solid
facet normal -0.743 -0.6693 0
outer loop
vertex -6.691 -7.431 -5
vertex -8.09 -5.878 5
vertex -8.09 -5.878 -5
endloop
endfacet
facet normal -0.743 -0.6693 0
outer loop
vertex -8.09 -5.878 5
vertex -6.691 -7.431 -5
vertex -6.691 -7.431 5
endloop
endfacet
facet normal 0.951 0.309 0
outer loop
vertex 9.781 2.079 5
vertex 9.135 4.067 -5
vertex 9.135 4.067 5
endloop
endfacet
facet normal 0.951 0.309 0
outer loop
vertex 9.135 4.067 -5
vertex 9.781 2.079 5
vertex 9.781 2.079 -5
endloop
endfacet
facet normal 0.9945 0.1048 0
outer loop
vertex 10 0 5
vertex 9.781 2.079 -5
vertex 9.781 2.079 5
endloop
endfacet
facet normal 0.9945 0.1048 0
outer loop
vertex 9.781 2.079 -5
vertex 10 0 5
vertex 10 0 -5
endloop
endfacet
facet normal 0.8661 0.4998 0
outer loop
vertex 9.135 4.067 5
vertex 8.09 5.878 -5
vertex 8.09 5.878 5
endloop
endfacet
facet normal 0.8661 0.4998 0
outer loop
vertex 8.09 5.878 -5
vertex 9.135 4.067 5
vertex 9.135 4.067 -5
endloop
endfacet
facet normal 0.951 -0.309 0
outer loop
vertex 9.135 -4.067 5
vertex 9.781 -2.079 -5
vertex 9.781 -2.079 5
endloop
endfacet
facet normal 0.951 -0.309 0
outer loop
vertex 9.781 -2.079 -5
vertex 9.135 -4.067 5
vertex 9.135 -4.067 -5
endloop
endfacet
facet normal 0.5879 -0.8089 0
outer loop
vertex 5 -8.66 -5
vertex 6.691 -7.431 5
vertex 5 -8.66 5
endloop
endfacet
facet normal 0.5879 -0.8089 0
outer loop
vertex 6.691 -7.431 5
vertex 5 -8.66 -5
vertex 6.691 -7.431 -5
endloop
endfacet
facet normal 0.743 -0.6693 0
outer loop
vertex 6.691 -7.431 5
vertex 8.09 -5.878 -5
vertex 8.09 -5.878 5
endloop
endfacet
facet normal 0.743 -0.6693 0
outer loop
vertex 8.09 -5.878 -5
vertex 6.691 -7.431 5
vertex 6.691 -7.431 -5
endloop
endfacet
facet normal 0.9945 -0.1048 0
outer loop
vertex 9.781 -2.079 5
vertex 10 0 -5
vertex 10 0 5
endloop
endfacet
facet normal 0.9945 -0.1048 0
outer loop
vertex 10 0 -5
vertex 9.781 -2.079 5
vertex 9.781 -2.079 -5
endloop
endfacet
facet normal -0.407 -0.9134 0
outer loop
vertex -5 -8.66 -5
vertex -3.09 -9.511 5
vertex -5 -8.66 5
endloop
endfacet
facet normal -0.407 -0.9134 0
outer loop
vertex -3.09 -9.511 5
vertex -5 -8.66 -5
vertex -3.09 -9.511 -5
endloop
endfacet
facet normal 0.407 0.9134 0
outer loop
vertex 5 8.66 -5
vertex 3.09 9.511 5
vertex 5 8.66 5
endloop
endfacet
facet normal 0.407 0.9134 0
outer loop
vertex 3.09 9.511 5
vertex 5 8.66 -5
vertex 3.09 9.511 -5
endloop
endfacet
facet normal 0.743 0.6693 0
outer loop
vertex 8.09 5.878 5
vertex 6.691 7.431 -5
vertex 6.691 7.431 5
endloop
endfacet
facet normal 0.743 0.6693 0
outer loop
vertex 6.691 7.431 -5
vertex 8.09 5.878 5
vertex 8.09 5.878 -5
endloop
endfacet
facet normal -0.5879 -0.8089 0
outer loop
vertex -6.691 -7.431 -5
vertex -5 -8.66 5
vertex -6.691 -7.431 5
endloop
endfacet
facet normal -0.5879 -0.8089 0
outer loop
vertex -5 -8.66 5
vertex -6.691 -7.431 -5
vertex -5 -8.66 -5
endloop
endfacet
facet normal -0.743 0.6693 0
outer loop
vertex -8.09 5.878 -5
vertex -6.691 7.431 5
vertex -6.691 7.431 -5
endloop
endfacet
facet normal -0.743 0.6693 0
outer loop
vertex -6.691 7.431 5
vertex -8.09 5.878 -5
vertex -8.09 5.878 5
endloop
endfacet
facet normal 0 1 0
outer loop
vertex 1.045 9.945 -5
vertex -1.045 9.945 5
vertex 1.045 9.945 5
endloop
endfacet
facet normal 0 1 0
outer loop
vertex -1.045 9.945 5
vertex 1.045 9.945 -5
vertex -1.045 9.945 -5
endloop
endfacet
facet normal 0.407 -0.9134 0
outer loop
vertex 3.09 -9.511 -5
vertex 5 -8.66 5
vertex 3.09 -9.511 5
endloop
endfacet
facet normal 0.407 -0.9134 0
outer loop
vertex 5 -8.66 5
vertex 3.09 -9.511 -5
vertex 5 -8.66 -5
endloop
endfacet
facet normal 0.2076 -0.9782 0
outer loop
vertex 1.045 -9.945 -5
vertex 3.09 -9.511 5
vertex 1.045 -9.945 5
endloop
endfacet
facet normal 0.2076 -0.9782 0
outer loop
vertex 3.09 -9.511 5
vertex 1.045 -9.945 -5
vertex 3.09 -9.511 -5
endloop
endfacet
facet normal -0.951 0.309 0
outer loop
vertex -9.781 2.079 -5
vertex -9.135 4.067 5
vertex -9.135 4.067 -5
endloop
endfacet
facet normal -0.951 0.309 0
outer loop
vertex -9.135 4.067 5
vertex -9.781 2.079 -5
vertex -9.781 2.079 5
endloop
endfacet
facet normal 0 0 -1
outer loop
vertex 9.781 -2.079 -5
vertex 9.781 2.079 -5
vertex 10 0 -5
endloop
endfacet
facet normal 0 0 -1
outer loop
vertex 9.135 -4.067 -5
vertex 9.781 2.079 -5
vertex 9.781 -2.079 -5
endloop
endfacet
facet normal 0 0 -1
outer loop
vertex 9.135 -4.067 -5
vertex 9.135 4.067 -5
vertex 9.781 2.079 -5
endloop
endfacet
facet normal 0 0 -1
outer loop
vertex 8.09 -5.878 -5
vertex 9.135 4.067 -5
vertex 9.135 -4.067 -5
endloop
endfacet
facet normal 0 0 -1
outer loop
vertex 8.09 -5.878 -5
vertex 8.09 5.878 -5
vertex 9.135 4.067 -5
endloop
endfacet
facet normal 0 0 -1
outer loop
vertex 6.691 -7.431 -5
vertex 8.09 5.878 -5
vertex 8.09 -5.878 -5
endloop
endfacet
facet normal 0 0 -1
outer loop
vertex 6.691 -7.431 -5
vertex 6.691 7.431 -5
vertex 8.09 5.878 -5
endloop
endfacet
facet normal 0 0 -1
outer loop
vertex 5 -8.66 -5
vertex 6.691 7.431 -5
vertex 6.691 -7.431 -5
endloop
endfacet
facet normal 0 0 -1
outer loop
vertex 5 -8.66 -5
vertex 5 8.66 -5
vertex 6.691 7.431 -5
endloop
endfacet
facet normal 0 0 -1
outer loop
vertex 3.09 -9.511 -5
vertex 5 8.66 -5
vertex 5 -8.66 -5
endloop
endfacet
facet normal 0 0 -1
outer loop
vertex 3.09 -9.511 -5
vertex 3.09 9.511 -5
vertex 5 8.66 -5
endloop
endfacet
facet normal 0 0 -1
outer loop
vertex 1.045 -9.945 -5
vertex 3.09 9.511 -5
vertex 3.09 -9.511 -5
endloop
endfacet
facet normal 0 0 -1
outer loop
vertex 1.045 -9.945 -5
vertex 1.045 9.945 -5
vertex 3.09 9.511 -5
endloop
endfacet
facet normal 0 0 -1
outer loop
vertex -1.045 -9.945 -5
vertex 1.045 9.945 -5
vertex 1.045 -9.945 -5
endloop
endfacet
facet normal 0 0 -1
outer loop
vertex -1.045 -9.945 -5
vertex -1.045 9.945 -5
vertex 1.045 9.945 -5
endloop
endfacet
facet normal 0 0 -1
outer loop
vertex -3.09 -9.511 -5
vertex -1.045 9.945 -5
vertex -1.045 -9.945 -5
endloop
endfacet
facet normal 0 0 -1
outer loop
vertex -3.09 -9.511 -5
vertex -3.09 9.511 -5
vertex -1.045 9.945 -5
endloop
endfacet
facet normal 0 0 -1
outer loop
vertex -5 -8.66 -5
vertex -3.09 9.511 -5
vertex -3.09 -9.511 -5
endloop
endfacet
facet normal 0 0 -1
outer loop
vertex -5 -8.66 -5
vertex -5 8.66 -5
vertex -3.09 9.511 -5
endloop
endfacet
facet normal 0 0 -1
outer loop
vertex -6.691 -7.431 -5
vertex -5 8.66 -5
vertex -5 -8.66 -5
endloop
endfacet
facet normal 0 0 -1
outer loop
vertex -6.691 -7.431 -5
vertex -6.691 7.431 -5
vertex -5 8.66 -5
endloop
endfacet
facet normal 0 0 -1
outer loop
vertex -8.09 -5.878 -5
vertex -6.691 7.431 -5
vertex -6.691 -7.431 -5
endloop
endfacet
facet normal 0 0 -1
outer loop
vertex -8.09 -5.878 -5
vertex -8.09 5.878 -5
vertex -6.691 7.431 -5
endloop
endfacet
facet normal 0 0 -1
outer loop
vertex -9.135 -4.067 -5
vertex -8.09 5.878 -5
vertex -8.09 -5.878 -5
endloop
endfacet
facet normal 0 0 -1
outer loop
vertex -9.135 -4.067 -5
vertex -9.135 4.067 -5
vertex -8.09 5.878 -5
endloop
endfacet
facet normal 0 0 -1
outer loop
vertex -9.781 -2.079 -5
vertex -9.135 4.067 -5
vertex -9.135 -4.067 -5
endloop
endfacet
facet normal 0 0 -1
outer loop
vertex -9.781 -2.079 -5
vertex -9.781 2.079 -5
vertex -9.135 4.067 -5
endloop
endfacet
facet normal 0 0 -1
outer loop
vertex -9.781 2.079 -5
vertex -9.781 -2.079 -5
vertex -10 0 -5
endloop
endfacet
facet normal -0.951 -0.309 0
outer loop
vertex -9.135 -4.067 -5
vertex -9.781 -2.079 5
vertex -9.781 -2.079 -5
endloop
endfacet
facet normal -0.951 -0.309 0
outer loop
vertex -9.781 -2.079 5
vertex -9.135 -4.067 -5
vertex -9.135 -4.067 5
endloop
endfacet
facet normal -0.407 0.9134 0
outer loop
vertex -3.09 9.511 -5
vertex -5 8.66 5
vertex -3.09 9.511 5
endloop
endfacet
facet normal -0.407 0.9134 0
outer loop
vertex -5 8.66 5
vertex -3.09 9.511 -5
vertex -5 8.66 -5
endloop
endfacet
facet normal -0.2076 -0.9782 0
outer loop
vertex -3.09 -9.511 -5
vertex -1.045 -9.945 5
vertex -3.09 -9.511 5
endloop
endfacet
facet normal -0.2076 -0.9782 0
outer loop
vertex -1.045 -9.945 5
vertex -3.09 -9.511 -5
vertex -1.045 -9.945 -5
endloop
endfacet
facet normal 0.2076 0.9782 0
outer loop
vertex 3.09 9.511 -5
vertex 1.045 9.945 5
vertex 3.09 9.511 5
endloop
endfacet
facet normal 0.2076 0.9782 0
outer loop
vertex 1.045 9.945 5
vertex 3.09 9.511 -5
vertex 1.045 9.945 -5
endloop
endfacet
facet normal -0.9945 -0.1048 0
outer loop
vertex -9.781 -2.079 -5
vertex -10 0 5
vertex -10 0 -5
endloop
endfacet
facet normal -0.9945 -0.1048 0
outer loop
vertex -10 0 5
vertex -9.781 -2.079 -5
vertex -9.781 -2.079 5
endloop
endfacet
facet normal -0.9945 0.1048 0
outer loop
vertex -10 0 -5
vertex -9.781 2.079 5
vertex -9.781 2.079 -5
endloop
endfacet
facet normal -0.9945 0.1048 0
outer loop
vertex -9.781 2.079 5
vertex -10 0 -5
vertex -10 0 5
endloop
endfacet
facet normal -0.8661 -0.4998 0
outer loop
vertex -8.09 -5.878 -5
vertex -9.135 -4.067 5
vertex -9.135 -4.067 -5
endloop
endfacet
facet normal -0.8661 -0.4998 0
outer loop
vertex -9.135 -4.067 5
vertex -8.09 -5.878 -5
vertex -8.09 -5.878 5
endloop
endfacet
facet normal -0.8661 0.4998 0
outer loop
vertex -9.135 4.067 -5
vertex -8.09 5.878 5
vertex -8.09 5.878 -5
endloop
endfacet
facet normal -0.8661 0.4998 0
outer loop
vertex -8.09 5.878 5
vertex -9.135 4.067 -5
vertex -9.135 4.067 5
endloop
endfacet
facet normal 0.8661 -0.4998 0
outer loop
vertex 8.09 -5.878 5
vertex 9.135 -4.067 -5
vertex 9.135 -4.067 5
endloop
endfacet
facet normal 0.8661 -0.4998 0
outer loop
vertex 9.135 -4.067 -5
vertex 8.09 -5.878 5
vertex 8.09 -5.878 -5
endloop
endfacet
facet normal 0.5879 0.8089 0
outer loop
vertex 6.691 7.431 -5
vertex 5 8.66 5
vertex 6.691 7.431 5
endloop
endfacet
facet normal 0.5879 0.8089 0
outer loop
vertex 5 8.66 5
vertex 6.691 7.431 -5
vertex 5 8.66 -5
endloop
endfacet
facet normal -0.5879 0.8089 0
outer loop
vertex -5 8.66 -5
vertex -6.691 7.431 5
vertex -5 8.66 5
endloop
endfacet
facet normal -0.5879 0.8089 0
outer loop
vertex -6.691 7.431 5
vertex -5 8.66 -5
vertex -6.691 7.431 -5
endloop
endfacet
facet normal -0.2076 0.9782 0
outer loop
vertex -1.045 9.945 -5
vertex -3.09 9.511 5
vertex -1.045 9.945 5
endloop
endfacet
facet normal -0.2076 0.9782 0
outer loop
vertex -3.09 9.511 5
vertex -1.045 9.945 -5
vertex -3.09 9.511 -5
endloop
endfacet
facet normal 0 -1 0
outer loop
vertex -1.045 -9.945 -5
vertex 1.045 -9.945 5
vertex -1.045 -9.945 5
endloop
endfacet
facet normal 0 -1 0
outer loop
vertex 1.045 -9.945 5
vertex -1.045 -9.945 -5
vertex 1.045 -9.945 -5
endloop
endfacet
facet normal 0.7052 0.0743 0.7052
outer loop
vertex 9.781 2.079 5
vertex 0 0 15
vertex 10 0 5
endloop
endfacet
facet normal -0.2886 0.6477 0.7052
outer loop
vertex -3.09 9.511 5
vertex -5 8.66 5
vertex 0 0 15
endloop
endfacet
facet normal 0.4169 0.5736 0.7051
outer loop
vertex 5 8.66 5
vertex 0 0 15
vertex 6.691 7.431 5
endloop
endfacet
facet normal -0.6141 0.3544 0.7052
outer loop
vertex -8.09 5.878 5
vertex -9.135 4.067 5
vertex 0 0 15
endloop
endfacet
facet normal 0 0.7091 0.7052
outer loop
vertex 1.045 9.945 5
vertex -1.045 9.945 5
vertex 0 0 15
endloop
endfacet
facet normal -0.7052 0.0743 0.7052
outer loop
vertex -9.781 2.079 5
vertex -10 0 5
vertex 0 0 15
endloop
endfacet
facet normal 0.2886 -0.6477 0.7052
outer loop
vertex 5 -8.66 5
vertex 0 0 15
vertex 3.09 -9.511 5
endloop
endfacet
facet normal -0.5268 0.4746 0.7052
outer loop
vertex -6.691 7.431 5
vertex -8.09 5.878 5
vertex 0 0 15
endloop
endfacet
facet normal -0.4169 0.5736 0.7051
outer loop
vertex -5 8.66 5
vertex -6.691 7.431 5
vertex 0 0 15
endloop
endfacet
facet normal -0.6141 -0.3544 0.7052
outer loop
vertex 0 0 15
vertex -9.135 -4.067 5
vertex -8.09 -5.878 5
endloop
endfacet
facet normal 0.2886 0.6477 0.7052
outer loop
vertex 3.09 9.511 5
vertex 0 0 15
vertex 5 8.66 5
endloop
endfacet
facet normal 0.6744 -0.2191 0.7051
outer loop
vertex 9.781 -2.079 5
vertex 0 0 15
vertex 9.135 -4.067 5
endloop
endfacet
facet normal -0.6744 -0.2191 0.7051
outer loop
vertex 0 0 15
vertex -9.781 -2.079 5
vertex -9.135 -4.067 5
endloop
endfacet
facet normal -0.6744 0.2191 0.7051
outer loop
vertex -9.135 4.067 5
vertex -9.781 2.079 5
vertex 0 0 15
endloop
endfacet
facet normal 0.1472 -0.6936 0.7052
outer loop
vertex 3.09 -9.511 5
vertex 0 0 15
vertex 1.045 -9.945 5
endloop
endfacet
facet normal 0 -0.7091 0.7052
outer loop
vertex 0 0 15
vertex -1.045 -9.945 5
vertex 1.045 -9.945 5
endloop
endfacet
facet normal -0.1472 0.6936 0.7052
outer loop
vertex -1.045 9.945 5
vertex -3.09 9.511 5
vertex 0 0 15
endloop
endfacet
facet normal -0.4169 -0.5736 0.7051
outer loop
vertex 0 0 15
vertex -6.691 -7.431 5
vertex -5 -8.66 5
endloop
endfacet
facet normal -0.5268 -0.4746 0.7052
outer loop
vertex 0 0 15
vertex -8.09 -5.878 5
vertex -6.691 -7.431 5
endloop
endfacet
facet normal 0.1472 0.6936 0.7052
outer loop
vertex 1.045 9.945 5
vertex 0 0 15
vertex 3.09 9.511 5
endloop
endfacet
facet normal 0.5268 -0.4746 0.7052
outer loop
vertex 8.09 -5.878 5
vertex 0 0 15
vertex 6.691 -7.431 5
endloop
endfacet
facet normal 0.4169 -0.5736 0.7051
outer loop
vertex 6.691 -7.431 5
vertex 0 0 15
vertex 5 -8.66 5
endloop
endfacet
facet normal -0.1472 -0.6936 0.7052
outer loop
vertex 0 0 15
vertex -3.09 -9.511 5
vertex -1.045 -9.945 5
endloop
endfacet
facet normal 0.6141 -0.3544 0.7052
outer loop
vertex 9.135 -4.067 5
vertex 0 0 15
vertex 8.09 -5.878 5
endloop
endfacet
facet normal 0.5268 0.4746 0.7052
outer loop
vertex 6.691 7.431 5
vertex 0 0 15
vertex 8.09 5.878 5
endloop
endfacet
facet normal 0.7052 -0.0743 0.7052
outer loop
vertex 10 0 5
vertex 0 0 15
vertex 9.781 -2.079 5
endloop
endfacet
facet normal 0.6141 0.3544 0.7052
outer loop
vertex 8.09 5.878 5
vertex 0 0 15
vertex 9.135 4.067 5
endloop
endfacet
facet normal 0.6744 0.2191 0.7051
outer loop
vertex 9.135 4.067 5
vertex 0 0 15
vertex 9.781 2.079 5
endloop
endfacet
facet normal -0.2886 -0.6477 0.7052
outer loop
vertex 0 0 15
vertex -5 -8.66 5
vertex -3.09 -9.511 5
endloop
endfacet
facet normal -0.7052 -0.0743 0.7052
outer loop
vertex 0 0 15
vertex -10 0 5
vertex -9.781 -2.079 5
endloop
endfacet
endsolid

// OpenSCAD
union() {
	cylinder(h = 10, r = 10, center = true);
	translate(v = [0, 0, 5]) {
		cylinder(r1 = 10, r2 = 0, h = 10);
	}
}
/***********************************************
******      SolidPython code:      *************
************************************************
 
#! /usr/bin/python
# -*- coding: UTF-8 -*-
import os, sys

from solid import *
from solid.utils import *

SEGMENTS = 48

def show_appended_python_code():
    a = cylinder( r=10, h=10, center=True) + up(5)( cylinder(r1=10, r2=0, h=10))
    
    return a

if __name__ == '__main__':    
    out_dir = sys.argv[1] if len(sys.argv) > 1 else os.curdir
    file_out = os.path.join( out_dir, 'append_solidpython_code.scad')
    
    a = show_appended_python_code()
    
    print "%(__file__)s: SCAD file written to: \n%(file_out)s \n"%vars()
    # ================================================================
    # = include_orig_code appends all python code as comments to the
    # = bottom of the generated OpenSCAD code, so the final document
    # = contains the easy-to-read python code as well as the SCAD.
    # = ------------------------------------------------------------ = 
    scad_render_to_file( a, file_out,  include_orig_code=True)        

 
 
***********************************************/
                            
